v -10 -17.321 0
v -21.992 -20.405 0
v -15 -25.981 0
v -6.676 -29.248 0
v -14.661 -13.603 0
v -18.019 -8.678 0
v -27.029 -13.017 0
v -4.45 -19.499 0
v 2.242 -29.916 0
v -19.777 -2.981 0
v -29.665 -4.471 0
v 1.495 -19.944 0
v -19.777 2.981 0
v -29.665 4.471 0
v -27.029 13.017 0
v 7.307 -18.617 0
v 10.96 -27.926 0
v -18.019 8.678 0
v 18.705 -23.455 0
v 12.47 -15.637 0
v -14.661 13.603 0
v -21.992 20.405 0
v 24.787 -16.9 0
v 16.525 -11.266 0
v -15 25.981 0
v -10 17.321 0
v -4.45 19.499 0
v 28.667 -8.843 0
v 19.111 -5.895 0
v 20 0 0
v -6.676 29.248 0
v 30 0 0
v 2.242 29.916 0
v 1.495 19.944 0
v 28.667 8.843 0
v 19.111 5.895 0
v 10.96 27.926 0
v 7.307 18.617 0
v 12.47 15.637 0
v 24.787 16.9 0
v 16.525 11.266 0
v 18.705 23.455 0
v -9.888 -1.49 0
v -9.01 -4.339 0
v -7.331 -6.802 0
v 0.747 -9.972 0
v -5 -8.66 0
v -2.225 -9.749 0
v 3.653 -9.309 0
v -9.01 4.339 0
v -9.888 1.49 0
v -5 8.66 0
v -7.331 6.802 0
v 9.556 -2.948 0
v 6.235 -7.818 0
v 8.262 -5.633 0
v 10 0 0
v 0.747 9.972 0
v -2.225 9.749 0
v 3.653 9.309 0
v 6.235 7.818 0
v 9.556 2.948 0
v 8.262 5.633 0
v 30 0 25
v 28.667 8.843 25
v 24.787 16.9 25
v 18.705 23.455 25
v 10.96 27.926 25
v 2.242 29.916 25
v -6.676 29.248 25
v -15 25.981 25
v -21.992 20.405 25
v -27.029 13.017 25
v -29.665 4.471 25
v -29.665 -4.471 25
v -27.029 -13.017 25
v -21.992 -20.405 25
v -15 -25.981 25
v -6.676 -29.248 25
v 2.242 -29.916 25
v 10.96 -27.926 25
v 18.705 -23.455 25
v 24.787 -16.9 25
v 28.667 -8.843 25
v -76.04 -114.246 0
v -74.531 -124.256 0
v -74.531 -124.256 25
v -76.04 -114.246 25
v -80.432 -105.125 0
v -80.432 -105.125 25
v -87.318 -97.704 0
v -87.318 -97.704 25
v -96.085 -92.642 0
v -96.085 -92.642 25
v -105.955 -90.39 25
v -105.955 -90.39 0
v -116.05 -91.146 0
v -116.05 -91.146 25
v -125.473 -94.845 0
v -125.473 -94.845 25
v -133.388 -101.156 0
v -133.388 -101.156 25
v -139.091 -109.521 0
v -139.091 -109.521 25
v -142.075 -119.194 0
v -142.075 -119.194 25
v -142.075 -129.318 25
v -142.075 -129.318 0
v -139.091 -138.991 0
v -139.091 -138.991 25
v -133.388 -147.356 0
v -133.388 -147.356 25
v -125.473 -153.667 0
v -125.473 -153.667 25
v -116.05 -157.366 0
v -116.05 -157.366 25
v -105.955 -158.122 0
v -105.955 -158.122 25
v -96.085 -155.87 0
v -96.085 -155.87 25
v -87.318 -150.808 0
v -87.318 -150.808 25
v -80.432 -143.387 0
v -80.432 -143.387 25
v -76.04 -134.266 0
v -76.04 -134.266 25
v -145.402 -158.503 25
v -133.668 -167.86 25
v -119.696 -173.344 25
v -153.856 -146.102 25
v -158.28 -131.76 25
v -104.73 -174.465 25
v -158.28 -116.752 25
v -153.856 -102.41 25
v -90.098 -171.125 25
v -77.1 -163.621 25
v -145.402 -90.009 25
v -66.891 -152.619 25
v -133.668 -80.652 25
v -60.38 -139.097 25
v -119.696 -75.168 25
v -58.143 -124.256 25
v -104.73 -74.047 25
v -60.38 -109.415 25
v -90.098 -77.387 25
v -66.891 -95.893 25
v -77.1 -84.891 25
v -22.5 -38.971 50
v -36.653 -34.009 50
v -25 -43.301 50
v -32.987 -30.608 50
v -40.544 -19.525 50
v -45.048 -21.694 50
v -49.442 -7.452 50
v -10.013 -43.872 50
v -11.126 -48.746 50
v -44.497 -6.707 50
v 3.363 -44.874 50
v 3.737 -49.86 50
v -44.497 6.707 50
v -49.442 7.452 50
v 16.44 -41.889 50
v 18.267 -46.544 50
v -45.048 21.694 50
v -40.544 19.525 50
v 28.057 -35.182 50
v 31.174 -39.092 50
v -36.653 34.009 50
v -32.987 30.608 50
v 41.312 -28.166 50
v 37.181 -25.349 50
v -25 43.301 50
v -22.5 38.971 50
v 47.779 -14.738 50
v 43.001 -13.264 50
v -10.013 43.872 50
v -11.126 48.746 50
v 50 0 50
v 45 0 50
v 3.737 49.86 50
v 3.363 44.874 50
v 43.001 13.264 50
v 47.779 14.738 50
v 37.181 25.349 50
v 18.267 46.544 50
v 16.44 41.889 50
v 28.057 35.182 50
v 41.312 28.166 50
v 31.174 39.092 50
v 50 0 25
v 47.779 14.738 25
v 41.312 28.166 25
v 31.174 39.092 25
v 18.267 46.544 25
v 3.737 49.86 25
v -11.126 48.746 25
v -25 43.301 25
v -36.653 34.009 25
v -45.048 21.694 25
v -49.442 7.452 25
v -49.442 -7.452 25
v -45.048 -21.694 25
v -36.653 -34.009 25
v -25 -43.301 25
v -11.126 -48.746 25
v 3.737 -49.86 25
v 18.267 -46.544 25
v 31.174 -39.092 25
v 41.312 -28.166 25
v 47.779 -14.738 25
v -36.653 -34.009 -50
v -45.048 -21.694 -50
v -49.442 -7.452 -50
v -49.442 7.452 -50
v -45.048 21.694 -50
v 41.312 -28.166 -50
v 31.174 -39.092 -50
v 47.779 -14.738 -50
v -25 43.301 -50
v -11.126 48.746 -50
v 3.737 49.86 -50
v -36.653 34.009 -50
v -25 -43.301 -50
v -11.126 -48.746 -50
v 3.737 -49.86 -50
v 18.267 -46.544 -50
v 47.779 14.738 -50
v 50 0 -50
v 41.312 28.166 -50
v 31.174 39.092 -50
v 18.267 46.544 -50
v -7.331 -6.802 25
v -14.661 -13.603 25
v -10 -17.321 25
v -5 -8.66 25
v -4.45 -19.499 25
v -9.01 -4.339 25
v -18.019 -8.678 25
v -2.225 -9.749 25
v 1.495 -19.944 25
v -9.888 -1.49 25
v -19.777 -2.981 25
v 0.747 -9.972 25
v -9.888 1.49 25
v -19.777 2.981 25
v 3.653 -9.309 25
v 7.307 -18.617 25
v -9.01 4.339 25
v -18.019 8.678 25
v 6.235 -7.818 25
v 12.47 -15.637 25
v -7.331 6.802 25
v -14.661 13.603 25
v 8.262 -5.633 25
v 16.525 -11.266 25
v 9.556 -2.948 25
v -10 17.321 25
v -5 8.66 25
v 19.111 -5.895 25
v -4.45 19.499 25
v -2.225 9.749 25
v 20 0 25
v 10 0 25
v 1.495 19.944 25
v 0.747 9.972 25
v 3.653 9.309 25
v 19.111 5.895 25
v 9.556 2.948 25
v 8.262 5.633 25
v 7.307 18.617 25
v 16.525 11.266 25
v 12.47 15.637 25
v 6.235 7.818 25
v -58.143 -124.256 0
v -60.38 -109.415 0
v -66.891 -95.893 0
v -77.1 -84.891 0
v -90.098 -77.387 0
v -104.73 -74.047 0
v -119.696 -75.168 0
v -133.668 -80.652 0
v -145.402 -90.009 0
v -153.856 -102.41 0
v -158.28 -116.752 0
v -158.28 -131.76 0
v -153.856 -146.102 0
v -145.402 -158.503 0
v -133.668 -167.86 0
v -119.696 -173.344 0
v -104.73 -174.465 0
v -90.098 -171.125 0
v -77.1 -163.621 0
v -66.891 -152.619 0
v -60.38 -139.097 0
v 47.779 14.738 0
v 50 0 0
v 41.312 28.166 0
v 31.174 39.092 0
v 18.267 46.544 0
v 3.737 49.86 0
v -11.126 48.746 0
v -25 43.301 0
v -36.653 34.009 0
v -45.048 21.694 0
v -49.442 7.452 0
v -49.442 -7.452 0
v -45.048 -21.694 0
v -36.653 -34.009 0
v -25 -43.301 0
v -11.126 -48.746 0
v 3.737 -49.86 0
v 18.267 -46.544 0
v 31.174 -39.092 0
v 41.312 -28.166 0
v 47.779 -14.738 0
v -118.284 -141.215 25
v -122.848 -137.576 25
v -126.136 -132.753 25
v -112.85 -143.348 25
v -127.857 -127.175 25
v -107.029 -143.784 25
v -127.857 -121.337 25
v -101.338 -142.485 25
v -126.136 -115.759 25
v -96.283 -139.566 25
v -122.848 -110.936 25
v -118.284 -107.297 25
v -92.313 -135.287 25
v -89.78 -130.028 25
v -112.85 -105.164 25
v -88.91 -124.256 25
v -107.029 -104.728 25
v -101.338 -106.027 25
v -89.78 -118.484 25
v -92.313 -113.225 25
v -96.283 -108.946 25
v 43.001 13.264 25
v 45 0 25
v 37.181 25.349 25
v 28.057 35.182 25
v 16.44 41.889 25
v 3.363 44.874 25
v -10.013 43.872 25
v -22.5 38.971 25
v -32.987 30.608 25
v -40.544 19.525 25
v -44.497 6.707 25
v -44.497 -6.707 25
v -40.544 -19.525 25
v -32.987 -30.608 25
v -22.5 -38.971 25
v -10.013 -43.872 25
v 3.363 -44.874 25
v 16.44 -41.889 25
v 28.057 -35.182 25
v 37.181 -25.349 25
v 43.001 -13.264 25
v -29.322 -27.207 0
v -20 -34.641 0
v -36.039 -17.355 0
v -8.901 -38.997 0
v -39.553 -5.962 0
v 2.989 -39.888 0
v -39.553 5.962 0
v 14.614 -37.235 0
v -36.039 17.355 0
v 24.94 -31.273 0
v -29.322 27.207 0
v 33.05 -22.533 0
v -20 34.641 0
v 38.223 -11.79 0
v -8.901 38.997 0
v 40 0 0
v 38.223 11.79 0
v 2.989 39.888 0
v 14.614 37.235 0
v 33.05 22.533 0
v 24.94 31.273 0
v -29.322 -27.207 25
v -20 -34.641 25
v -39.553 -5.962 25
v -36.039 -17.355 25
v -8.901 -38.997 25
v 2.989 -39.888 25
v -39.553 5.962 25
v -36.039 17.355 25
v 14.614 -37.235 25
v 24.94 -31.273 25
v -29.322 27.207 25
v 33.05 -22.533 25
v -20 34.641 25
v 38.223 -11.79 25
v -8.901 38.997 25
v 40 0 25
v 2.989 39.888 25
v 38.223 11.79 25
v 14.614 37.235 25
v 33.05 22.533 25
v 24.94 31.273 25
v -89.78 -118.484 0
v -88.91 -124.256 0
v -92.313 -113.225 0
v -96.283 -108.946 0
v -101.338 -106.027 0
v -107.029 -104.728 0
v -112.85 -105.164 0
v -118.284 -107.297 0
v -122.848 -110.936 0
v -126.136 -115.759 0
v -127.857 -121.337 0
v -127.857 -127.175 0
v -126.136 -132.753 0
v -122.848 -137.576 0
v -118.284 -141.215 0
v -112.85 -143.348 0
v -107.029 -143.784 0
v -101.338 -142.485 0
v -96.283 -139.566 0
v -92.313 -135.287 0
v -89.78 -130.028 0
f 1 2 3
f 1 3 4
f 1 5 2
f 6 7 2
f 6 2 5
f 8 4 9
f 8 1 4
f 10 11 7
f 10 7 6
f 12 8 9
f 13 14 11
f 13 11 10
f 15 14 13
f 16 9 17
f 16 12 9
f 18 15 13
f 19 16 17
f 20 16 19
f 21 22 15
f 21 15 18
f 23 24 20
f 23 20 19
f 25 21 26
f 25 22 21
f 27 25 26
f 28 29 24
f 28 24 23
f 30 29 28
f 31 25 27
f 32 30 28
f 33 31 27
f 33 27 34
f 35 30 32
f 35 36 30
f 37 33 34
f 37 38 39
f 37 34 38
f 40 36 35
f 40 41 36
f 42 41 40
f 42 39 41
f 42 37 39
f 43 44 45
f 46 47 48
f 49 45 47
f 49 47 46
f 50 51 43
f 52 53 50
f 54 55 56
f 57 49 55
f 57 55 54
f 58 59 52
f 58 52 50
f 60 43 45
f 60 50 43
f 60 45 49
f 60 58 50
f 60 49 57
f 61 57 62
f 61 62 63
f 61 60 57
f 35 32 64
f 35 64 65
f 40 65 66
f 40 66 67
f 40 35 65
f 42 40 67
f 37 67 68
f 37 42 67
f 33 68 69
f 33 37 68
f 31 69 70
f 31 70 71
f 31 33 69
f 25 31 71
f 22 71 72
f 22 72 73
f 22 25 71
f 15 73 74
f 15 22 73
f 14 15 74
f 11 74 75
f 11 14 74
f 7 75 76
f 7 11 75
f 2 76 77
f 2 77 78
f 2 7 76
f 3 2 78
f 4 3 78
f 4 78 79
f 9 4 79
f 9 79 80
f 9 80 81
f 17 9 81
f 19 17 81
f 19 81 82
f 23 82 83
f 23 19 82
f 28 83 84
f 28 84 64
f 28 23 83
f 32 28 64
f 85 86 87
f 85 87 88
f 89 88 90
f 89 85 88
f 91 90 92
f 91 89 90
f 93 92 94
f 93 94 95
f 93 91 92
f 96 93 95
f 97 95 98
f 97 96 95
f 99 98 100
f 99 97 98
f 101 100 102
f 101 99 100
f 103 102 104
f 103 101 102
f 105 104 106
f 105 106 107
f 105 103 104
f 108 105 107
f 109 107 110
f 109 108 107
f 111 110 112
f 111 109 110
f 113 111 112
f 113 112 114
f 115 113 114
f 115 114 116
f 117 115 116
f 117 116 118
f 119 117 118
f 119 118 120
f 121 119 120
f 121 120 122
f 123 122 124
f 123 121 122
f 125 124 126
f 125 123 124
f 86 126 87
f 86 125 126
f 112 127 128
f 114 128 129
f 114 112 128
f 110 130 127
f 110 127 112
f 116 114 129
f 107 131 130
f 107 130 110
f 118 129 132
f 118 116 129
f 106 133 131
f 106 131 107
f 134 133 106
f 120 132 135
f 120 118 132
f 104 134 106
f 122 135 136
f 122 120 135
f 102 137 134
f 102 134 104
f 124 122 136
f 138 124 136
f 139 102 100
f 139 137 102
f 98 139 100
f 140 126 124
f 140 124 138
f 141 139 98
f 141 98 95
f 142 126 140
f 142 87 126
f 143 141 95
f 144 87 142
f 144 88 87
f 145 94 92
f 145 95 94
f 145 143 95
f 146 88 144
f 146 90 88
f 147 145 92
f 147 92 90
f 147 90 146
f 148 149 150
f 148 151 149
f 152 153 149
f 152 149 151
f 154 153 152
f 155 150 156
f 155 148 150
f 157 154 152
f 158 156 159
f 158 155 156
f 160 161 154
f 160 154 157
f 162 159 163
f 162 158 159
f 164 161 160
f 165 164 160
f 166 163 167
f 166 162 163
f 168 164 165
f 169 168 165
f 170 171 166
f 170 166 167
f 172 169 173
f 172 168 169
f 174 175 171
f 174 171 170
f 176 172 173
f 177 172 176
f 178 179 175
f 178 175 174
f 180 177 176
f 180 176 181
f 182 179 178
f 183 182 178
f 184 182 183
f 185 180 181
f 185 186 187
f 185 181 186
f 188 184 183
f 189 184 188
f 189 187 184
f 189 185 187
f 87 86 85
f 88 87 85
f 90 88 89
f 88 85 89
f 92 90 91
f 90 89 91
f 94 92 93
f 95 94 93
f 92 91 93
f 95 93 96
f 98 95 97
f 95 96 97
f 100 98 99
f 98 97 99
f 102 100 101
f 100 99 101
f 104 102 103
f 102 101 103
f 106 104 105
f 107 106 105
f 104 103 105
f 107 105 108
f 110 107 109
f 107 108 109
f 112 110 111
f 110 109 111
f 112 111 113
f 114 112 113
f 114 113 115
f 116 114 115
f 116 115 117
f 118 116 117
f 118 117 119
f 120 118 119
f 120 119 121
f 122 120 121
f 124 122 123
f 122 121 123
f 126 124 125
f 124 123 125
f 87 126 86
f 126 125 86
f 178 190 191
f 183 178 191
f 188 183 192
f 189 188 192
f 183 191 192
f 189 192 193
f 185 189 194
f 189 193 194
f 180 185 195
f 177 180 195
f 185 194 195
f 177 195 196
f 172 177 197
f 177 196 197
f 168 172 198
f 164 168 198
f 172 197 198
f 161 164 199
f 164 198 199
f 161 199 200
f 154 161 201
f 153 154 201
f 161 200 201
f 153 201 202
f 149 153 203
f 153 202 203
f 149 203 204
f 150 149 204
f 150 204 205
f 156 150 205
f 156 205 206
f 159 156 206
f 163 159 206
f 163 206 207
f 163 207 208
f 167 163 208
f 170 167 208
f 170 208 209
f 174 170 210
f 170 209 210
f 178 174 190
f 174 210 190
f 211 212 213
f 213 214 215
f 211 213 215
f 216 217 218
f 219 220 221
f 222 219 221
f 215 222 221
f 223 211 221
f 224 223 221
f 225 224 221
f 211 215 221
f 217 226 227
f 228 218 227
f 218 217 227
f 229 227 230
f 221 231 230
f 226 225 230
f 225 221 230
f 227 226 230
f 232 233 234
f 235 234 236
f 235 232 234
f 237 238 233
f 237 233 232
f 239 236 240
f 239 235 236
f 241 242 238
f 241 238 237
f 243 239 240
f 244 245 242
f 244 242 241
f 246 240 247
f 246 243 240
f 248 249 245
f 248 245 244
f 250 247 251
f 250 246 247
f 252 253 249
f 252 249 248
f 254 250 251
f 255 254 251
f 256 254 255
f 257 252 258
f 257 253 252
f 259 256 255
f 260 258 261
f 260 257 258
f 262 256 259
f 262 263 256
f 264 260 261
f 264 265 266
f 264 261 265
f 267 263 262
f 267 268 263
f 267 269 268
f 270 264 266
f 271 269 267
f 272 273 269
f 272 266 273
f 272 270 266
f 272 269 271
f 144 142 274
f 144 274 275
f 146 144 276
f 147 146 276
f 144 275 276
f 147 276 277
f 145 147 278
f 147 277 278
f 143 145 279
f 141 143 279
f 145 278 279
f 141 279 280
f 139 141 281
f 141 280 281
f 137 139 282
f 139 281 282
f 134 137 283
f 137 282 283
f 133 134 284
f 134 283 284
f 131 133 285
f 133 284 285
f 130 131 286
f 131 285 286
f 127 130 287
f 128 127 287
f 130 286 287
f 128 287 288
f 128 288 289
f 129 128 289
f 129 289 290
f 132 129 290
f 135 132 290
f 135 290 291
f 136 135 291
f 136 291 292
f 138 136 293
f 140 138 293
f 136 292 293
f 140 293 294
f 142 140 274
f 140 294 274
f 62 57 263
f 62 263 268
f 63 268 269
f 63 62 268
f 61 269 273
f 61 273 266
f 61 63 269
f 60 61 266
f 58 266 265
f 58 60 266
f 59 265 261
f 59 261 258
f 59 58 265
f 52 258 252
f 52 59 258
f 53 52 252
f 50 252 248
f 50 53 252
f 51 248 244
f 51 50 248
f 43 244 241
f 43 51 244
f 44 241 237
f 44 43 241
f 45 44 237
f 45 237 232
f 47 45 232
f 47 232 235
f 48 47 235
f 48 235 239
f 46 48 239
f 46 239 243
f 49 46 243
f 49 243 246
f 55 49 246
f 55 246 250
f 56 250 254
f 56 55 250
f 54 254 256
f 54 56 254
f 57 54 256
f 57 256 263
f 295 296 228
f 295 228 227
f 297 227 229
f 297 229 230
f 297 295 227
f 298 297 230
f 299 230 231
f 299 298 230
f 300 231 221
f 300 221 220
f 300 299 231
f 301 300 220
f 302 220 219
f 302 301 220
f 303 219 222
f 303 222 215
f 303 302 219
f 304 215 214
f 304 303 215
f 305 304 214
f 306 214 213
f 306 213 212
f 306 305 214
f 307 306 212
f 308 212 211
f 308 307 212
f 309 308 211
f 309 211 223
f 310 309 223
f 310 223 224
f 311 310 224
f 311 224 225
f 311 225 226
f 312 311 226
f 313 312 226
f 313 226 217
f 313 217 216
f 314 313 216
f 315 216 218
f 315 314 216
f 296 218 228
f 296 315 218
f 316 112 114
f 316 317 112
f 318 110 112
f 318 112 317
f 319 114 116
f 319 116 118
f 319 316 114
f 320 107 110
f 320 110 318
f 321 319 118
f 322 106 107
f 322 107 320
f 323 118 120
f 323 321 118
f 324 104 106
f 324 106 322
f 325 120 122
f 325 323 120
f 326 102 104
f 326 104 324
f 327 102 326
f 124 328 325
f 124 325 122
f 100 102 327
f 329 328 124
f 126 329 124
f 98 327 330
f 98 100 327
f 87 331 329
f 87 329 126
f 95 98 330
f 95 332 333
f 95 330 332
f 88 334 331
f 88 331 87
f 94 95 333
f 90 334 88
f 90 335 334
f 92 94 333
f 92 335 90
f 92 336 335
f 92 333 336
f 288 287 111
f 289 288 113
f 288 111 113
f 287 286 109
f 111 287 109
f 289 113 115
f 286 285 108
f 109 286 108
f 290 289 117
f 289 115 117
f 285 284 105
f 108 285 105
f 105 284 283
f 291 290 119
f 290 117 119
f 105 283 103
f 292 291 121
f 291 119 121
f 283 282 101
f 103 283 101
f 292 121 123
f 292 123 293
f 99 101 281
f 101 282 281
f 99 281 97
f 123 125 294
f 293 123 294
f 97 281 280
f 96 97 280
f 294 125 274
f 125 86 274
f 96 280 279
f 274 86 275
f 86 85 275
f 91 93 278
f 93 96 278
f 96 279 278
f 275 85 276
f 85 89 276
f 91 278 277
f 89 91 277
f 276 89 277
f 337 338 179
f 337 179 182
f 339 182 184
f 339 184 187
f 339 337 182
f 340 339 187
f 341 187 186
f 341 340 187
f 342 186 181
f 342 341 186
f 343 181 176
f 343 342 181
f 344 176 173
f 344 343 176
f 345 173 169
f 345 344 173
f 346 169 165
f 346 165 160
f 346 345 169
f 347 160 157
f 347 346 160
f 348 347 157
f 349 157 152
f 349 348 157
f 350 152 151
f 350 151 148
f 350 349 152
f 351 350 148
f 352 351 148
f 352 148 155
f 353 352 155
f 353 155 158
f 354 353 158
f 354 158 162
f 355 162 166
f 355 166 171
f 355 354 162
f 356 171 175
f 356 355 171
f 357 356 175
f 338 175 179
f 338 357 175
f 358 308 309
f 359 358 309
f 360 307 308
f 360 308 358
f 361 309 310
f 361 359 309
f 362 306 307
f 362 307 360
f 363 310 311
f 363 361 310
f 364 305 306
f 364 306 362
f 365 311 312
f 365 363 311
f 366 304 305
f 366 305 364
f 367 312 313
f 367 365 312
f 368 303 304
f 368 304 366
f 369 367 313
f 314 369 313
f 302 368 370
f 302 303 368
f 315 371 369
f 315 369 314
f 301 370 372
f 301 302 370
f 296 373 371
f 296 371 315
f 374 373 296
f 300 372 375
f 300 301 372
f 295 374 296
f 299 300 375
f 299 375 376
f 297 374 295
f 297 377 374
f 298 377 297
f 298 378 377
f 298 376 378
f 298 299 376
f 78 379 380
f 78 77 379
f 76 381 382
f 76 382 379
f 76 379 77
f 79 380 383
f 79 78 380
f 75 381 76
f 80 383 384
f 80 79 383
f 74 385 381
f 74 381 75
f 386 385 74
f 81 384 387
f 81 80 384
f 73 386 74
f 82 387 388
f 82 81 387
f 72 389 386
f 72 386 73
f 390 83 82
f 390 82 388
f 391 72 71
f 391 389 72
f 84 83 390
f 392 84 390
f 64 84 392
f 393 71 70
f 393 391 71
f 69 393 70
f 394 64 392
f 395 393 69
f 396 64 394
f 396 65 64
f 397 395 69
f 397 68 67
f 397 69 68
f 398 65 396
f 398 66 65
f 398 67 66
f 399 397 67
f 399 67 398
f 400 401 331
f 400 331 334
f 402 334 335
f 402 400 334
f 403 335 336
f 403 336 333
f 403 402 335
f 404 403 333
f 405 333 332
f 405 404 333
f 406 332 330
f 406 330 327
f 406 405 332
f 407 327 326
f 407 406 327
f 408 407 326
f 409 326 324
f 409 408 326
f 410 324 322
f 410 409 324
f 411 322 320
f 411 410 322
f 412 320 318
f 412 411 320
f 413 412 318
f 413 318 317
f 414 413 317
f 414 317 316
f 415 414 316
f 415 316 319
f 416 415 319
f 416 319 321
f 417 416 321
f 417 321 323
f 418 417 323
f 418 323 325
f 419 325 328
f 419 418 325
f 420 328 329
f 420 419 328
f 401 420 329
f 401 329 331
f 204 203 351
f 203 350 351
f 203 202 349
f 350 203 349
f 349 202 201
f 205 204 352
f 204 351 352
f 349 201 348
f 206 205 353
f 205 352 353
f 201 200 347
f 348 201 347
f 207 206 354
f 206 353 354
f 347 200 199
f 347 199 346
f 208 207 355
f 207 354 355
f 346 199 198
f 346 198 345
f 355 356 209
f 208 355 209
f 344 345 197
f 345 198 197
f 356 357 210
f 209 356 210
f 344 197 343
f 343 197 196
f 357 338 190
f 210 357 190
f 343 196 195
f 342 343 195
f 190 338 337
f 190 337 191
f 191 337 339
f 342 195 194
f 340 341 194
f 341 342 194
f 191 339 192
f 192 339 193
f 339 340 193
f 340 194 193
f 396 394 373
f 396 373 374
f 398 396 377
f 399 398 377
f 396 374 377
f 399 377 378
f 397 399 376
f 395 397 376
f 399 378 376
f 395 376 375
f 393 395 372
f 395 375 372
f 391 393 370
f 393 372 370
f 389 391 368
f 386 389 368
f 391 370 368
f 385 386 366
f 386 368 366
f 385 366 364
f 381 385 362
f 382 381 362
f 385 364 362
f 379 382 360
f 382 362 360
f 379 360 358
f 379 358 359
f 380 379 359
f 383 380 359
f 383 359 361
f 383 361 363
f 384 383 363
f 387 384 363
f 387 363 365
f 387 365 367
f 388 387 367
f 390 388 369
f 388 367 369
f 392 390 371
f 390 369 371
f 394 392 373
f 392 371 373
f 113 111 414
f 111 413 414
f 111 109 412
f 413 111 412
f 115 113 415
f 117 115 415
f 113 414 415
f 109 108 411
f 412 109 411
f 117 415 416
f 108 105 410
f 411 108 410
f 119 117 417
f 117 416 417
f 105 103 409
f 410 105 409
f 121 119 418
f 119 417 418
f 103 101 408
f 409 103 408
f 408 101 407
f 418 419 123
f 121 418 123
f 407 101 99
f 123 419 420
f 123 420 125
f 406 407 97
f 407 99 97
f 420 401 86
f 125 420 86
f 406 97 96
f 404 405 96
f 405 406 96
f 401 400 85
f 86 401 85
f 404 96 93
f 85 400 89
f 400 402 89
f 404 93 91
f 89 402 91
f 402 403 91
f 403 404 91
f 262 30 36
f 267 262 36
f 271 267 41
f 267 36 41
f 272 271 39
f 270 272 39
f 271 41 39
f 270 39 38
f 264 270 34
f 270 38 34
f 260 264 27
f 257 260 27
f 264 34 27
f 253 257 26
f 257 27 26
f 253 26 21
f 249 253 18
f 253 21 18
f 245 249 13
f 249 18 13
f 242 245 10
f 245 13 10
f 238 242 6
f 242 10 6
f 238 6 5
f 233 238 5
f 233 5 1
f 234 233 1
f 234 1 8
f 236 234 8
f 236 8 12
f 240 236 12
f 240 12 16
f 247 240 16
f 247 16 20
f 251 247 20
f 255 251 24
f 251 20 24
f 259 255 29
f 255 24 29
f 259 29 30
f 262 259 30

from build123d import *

# Parameters (mm, degrees)
F0_R      = 50
F1_DEPTH  = 50
F2_R      = 40
F2_R_2    = 30
F2_R_3    = 20
F2_R_4    = 10
F3_DEPTH  = 25
F4_R      = 50
F4_R_2    = 45.0000017881
F5_DEPTH  = 25
F6_R      = 50.3499570473
F6_R_2    = 33.9613081037
F7_DEPTH  = 25
F6_R_3    = 19.5827403344
F9_DEPTH  = 25
F10_DEPTH = 25


# Not quite as in the source:
# - a feature of the source that left no trace in its solid (it failed there, or was rolled back) is left out


with BuildPart() as f1:
    # F0 (on Top) → F1 (new body)
    with BuildSketch(Plane.XY):
        Circle(F0_R)
    extrude(amount=-F1_DEPTH)

    # F2 (on Top) → F3 (join)
    with BuildSketch(Plane.XY):
        Circle(F2_R)
        Circle(F2_R_2, mode=Mode.SUBTRACT)
        Circle(F2_R_3)
        Circle(F2_R_4, mode=Mode.SUBTRACT)
    extrude(amount=F3_DEPTH)


with BuildPart() as f5:
    # F4 (on face) → F5 (new body)
    with BuildSketch(Plane.XY.offset(25)):
        Circle(F4_R)
        Circle(F4_R_2, mode=Mode.SUBTRACT)
    extrude(amount=F5_DEPTH)


with BuildPart() as f7:
    # F6 (on Top) → F7 (new body)
    with BuildSketch(Plane.XY):
        with Locations((-108.4925532341, -124.2559552193)):
            Circle(F6_R)
        with Locations((-108.4925532341, -124.2559552193)):
            Circle(F6_R_2, mode=Mode.SUBTRACT)
    extrude(amount=F7_DEPTH)


with BuildPart() as f9:
    # F6 (on Top) → F9 (new body)
    with BuildSketch(Plane.XY):
        with Locations((-108.4925532341, -124.2559552193)):
            Circle(F6_R_2)
        with Locations((-108.4925532341, -124.2559552193)):
            Circle(F6_R_3, mode=Mode.SUBTRACT)
    extrude(amount=F9_DEPTH)


with BuildPart() as f10:
    # F6 (on Top) → F10 (new body)
    with BuildSketch(Plane.XY):
        with Locations((-108.4925532341, -124.2559552193)):
            Circle(F6_R)
        with Locations((-108.4925532341, -124.2559552193)):
            Circle(F6_R_2, mode=Mode.SUBTRACT)
    extrude(amount=F10_DEPTH)


solid = Compound([f1.part, f5.part, f9.part, f10.part])
